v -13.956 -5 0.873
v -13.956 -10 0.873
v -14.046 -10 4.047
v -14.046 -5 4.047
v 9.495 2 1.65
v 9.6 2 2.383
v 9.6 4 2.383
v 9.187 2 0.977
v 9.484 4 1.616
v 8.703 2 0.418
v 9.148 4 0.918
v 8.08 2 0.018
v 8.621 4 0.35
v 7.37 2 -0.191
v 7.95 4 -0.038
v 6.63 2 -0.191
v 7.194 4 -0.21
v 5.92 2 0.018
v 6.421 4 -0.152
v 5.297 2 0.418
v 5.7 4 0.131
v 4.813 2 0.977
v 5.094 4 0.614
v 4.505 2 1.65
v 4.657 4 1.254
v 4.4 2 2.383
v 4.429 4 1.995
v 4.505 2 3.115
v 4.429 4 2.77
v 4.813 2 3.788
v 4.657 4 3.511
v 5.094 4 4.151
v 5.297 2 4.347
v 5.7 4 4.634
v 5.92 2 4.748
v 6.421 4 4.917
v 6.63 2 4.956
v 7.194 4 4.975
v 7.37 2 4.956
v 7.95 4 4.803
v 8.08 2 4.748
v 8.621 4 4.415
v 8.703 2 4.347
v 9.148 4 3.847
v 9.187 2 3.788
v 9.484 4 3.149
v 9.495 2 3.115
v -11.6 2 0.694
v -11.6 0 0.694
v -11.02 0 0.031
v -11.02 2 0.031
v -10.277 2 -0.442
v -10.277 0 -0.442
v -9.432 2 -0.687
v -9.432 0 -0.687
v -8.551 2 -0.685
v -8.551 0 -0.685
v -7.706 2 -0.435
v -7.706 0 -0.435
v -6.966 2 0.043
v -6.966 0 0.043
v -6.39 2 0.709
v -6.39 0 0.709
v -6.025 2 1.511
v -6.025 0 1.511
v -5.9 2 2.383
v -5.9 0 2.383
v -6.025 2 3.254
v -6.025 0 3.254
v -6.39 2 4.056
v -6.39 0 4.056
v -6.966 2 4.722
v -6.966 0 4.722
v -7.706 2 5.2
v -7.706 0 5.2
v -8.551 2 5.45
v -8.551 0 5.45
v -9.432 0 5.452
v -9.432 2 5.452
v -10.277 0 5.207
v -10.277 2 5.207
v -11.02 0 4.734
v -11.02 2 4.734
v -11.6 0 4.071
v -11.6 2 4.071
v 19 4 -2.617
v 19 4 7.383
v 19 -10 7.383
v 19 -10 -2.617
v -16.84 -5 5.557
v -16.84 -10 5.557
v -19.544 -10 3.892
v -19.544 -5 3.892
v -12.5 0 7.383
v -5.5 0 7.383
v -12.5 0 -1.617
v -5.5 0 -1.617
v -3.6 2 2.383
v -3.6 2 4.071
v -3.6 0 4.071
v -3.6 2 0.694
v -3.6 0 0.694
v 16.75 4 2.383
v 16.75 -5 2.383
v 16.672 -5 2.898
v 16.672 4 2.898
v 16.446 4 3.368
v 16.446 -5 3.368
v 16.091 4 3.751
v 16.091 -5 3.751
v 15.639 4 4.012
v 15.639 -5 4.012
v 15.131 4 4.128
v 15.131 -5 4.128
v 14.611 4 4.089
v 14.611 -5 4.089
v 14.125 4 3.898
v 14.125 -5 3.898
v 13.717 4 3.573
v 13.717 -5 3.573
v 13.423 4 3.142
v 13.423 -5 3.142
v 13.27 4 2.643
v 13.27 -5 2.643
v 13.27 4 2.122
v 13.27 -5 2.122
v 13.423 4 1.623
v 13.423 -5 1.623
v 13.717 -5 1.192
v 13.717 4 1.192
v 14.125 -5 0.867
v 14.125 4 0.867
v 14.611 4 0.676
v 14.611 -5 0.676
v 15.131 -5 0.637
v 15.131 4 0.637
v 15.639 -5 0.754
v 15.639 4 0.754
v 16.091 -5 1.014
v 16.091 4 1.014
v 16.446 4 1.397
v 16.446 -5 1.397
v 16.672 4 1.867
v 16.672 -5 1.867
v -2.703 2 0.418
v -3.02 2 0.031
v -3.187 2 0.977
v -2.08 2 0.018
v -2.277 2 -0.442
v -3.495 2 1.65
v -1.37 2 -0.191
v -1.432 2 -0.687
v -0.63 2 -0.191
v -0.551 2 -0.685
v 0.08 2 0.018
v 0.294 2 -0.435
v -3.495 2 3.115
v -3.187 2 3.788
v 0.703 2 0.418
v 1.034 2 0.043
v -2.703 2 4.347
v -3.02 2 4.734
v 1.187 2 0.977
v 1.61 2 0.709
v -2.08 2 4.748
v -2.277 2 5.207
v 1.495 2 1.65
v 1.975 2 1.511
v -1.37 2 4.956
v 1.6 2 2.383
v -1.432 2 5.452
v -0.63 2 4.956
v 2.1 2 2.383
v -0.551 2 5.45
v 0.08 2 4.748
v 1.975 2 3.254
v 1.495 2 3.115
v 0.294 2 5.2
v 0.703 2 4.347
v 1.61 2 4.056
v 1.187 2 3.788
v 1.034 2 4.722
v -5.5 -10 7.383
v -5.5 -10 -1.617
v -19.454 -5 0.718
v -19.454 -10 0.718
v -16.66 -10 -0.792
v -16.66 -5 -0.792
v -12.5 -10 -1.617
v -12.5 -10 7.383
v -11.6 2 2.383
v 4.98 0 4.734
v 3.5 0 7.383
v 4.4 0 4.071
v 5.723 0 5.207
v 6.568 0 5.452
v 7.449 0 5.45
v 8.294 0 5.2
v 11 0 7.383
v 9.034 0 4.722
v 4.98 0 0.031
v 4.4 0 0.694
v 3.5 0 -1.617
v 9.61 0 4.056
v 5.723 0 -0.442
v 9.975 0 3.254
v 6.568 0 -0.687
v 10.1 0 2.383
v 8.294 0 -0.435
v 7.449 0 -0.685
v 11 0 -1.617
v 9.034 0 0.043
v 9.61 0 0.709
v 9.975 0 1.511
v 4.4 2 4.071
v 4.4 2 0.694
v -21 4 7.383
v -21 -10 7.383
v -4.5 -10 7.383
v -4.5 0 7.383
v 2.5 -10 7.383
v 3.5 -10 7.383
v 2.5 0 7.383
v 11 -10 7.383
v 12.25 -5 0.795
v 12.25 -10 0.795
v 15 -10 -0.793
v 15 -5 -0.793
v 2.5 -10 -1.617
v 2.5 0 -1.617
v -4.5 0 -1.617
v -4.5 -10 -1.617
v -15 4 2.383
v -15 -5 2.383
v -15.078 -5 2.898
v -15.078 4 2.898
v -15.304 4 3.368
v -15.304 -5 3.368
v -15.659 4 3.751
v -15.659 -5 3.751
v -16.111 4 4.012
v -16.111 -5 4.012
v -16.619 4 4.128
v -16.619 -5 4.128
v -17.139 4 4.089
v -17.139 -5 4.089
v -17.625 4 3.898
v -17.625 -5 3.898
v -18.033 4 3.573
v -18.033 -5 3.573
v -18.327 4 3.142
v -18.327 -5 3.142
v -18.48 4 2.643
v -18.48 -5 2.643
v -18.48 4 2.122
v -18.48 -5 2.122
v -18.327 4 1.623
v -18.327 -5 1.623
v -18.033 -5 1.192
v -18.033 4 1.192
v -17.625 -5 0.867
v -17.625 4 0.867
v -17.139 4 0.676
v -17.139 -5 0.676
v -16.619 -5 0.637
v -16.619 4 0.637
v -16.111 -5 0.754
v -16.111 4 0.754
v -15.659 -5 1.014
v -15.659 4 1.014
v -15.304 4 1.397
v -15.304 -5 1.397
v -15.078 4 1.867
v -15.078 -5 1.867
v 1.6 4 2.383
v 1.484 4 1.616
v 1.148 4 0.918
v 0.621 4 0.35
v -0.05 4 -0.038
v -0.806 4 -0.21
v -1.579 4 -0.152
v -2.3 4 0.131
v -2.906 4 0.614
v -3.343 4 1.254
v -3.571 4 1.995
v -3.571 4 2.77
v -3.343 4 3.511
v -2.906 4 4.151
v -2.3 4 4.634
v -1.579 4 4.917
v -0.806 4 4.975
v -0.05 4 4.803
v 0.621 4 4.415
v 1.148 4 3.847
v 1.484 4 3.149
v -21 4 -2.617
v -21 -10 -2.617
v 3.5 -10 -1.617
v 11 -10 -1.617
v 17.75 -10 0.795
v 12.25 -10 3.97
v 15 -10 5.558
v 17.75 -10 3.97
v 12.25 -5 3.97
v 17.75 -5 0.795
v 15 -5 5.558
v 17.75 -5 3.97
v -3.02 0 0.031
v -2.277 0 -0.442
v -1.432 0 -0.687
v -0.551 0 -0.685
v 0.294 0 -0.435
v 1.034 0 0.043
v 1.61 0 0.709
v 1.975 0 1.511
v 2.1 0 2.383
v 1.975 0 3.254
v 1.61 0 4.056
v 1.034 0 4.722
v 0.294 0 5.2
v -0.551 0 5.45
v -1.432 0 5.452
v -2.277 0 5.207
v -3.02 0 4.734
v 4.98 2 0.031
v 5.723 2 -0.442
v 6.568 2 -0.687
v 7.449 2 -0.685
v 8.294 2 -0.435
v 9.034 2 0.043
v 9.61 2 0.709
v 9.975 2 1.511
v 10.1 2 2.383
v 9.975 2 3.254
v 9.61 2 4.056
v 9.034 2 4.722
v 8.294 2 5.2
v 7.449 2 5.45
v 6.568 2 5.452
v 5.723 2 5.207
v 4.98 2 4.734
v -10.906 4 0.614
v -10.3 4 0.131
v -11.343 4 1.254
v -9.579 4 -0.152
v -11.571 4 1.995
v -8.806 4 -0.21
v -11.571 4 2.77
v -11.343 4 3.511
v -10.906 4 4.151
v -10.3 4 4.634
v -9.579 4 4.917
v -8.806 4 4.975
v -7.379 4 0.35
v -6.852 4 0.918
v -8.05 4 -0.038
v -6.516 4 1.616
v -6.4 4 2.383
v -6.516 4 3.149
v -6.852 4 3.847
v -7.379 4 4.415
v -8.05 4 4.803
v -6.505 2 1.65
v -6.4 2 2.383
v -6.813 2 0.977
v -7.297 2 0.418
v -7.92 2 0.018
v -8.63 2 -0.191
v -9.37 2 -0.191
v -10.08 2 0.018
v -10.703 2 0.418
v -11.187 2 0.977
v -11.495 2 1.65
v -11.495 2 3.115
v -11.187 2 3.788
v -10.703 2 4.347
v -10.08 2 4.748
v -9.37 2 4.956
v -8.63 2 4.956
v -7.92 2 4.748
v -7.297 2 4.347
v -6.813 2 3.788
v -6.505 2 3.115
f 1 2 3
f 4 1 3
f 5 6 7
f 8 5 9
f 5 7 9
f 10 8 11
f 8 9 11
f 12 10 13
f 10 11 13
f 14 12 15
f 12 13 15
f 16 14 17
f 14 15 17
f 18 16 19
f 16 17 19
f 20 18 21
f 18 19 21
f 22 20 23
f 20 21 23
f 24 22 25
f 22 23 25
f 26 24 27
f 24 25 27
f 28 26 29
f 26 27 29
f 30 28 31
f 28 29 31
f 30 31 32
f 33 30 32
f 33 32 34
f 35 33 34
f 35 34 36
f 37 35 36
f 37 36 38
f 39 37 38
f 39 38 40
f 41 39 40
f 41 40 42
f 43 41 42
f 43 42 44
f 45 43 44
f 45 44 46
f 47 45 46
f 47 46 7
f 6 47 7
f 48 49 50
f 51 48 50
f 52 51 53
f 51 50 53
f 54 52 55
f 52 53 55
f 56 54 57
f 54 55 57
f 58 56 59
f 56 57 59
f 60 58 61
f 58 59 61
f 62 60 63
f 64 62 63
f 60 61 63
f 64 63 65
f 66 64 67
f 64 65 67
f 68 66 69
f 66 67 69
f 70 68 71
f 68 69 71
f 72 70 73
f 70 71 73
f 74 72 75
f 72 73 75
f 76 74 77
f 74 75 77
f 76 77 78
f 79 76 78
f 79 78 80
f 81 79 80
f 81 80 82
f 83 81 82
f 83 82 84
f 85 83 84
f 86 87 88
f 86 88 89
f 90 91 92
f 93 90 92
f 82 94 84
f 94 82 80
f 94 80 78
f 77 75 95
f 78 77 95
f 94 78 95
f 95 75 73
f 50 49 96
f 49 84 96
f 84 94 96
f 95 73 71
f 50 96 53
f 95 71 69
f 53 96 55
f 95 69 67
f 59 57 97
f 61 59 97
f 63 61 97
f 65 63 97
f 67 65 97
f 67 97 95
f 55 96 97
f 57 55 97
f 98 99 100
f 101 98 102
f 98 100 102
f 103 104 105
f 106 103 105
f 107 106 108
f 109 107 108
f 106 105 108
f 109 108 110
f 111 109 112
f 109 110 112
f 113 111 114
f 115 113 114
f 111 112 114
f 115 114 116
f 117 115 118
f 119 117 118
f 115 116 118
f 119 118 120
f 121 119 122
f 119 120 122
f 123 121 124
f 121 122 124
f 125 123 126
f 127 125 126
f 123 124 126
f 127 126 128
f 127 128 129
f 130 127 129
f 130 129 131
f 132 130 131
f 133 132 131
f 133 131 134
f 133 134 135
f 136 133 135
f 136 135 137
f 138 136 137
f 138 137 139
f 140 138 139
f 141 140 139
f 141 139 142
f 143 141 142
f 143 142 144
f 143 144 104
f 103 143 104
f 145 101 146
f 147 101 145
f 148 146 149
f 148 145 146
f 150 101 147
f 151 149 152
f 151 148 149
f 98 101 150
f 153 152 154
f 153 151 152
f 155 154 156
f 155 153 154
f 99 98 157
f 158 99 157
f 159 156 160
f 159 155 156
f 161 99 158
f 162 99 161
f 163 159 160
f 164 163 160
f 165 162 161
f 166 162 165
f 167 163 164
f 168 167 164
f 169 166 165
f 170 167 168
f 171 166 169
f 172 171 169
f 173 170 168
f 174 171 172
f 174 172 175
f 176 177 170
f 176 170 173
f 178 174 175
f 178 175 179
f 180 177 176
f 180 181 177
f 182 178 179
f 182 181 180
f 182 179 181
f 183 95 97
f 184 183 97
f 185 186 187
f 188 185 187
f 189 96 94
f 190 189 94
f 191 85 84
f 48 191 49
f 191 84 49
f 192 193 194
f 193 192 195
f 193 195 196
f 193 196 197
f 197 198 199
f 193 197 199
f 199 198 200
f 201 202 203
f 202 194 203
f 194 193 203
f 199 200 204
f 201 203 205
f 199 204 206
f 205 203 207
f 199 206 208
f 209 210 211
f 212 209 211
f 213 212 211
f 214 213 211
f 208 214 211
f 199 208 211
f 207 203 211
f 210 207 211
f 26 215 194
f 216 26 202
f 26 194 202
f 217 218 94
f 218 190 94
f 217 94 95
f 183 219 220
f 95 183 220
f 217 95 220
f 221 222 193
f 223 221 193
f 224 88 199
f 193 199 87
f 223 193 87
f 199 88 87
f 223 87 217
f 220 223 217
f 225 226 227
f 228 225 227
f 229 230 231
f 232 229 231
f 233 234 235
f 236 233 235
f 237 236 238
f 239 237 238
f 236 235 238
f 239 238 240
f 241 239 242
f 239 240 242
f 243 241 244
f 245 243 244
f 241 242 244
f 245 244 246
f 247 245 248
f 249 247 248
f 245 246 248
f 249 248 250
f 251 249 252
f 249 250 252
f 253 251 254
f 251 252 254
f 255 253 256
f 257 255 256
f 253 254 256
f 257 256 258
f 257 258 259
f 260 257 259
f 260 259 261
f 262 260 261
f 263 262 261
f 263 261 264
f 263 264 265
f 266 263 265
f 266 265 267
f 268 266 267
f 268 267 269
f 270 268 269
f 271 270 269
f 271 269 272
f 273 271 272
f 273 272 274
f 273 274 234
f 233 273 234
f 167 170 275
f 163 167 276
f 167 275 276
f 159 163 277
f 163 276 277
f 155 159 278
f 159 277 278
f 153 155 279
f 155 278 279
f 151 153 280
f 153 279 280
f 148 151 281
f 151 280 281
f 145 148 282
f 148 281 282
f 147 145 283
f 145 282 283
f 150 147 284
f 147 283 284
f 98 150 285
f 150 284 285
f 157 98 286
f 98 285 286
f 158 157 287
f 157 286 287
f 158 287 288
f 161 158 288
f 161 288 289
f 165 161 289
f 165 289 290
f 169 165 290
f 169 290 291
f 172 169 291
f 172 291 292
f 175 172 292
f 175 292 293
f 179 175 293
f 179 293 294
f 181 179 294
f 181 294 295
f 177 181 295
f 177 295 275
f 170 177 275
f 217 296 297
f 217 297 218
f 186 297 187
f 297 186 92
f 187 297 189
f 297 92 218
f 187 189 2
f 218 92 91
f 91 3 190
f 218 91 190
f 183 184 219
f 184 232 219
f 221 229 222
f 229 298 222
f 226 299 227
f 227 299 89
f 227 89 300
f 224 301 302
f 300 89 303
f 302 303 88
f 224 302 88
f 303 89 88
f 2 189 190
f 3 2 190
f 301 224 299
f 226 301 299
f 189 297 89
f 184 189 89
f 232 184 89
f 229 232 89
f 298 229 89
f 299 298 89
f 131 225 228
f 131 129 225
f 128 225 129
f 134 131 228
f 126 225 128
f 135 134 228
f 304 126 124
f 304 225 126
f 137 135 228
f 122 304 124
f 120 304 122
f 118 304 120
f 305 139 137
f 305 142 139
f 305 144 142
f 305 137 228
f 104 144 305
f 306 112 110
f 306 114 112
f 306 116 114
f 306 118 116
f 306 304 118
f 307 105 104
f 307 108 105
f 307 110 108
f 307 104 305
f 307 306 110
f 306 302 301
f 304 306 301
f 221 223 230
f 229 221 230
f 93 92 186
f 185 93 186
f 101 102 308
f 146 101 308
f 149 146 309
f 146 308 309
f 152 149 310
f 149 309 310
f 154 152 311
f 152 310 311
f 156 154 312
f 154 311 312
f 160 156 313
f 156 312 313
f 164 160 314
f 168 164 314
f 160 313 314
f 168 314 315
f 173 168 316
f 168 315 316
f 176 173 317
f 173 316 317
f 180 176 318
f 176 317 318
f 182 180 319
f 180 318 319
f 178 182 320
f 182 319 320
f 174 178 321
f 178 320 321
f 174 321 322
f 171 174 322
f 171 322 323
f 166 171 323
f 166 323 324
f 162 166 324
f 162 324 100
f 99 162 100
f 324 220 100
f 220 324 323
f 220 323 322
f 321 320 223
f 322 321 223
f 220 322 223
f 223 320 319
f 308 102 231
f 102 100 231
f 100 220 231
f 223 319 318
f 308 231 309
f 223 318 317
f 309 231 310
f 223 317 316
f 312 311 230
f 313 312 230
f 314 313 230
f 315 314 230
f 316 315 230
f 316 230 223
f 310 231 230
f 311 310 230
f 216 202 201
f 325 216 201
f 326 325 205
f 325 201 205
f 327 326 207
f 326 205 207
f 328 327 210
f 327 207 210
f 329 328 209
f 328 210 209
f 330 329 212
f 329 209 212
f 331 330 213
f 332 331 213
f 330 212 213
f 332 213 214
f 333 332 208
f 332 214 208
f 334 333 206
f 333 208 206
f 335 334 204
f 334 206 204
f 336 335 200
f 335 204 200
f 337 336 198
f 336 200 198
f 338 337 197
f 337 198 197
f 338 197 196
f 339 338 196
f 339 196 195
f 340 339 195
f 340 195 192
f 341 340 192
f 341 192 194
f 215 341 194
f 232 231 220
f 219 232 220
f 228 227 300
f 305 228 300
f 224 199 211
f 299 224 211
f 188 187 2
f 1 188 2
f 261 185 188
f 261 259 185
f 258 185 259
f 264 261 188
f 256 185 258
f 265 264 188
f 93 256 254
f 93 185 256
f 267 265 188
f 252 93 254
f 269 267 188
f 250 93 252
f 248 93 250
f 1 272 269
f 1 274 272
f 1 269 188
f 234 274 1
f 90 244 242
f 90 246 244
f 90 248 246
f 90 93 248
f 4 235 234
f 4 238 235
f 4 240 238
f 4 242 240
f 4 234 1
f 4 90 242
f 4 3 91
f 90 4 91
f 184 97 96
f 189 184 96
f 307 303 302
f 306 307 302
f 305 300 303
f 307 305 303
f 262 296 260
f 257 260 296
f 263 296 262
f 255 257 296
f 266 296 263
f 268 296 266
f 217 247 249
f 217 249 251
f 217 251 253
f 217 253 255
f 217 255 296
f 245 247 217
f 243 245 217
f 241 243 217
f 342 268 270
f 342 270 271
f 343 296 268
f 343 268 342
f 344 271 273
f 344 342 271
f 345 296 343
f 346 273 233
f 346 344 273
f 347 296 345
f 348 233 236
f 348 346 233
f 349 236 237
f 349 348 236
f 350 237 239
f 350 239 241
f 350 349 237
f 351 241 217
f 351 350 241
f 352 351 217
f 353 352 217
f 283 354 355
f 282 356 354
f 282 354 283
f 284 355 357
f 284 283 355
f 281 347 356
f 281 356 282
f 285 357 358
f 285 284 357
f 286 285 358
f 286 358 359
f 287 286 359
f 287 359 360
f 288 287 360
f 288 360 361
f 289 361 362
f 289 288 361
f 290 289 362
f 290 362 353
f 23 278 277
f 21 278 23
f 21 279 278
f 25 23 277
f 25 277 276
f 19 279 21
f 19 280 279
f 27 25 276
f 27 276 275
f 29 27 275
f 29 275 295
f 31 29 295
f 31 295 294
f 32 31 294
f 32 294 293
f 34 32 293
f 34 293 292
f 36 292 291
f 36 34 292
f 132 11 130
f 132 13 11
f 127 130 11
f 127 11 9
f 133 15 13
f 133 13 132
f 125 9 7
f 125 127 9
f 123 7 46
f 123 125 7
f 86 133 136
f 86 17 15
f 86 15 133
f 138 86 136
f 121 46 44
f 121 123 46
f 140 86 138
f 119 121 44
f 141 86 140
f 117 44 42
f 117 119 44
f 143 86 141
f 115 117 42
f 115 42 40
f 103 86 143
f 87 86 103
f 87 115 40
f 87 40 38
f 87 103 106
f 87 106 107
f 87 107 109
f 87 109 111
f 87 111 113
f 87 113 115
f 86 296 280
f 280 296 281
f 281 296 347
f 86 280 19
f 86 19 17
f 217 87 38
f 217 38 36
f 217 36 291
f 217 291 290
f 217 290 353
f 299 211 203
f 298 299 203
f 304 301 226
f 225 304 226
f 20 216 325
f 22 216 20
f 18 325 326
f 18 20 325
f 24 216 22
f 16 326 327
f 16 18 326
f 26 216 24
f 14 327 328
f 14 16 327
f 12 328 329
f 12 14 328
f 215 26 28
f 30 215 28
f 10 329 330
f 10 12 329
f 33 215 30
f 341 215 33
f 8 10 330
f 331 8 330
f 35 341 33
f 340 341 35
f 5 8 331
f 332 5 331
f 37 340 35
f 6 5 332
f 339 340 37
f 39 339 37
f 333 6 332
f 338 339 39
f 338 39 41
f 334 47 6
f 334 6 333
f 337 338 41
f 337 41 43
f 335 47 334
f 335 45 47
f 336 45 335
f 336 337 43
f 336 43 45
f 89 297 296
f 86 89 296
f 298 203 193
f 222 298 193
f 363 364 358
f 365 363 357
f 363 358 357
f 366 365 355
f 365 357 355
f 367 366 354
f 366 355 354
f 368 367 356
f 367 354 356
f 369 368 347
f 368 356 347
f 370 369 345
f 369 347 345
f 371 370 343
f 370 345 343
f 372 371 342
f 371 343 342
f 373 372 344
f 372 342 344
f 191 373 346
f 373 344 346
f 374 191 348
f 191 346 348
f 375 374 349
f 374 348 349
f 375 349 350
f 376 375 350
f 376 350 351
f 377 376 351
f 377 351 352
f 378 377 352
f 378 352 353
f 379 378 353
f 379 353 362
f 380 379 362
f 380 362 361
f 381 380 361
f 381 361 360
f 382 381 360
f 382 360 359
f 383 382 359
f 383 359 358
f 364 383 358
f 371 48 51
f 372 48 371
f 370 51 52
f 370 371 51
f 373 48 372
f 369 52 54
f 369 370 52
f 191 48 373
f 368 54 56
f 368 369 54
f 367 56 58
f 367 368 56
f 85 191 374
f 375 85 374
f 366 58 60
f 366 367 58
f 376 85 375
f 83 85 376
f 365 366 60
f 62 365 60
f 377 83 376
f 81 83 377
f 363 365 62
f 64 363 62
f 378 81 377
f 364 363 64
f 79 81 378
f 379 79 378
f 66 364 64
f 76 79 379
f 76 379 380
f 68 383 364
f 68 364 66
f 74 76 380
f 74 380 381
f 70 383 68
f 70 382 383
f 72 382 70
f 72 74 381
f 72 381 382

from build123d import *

# Parameters (mm, degrees)
SKETCH1_W           = 32
SKETCH1_H           = 10
BOSS_EXTRUDE1_DEPTH = 4
SKETCH2_R           = 2.6
CUT_EXTRUDE1_DEPTH  = 10
CUT_EXTRUDE4_DEPTH  = 2
BOSS_EXTRUDE4_DEPTH = 10
SKETCH9_W           = 10
SKETCH9_H           = 14
BOSS_EXTRUDE5_DEPTH = 4
SKETCH10_W          = 10
SKETCH10_H          = 14
BOSS_EXTRUDE6_DEPTH = 4
SKETCH6_R           = 1.75
CUT_EXTRUDE5_DEPTH  = 40
CUT_EXTRUDE6_DEPTH  = 5


with BuildPart() as part:
    # Sketch1 → Boss-Extrude1 (new body)
    with BuildSketch(Plane(origin=(0, 0, 0), x_dir=(1, 0, 0), z_dir=(0, 1, 0))):
        with Locations((-1, -2.382550336)):
            Rectangle(SKETCH1_W, SKETCH1_H)
    extrude(amount=BOSS_EXTRUDE1_DEPTH)

    # Sketch2 → Cut-Extrude1 (cut)
    with BuildSketch(Plane(origin=(0, 4, 0), x_dir=(1, 0, 0), z_dir=(0, 1, 0))):
        with Locations((-9, -2.382550336)):
            Circle(SKETCH2_R)
        with Locations((-1, -2.382550336)):
            Circle(SKETCH2_R)
        with Locations((7, -2.382550336)):
            Circle(SKETCH2_R)
    extrude(amount=-CUT_EXTRUDE1_DEPTH, mode=Mode.SUBTRACT)

    # Sketch3 → Cut-Extrude4 (cut)
    with BuildSketch(Plane.XZ):
        with BuildLine():
            Line((-11.6, 4.070744637), (-11.6, 0.694356034))
            ThreePointArc((-11.6, 0.694356034), (-5.9, 2.382550336), (-11.6, 4.070744637))
        make_face()
        with BuildLine():
            Line((-3.6, 4.070744637), (-3.6, 0.694356034))
            ThreePointArc((-3.6, 0.694356034), (2.1, 2.382550336), (-3.6, 4.070744637))
        make_face()
        with BuildLine():
            Line((4.4, 4.070744637), (4.4, 0.694356034))
            ThreePointArc((4.4, 0.694356034), (10.1, 2.382550336), (4.4, 4.070744637))
        make_face()
    extrude(amount=-CUT_EXTRUDE4_DEPTH, mode=Mode.SUBTRACT)

    # Sketch5 → Boss-Extrude4 (add)
    with BuildSketch(Plane.XZ):
        Polygon((-17, -1.617449664), (-17, -2.617449664), (15, -2.617449664), (15, -1.617449664), (15, 7.382550336), (11, 7.382550336), (11, -1.617449664), (3.5, -1.617449664), (3.5, 7.382550336), (2.5, 7.382550336), (2.5, -1.617449664), (-4.5, -1.617449664), (-4.5, 7.382550336), (-5.5, 7.382550336), (-5.5, -1.617449664), (-12.5, -1.617449664), (-12.5, 7.382550336), (-13, 7.382550336), (-13.5, 7.382550336), (-17, 7.382550336), align=None)
    extrude(amount=BOSS_EXTRUDE4_DEPTH)

    # Sketch9 → Boss-Extrude5 (add)
    with BuildSketch(Plane(origin=(15, 0, 0), x_dir=(0, 0, -1), z_dir=(1, 0, 0))):
        with Locations((-2.382550336, -3)):
            Rectangle(SKETCH9_W, SKETCH9_H)
    extrude(amount=BOSS_EXTRUDE5_DEPTH)

    # Sketch10 → Boss-Extrude6 (add)
    with BuildSketch(Plane.ZY.offset(17)):
        with Locations((2.382550336, -3)):
            Rectangle(SKETCH10_W, SKETCH10_H)
    extrude(amount=BOSS_EXTRUDE6_DEPTH)

    # Sketch6 → Cut-Extrude5 (cut)
    with BuildSketch(Plane.XZ.offset(10)):
        with Locations((-16.75, 2.382550336)):
            Circle(SKETCH6_R)
        with Locations((15, 2.382550336)):
            Circle(SKETCH6_R)
    extrude(amount=-CUT_EXTRUDE5_DEPTH, mode=Mode.SUBTRACT)

    # Sketch8 → Cut-Extrude6 (cut)
    with BuildSketch(Plane.XZ.offset(10)):
        Polygon((-16.839532769, 5.556714354), (-19.543673061, 3.892094692), (-19.454140291, 0.717930674), (-16.660467231, -0.791613683), (-13.956326939, 0.873005979), (-14.045859709, 4.047169998), align=None)
        Polygon((15, 5.557976816), (12.25, 3.970263576), (12.25, 0.794837095), (15, -0.792876145), (17.75, 0.794837095), (17.75, 3.970263576), align=None)
    extrude(amount=-CUT_EXTRUDE6_DEPTH, mode=Mode.SUBTRACT)


solid = part.part
